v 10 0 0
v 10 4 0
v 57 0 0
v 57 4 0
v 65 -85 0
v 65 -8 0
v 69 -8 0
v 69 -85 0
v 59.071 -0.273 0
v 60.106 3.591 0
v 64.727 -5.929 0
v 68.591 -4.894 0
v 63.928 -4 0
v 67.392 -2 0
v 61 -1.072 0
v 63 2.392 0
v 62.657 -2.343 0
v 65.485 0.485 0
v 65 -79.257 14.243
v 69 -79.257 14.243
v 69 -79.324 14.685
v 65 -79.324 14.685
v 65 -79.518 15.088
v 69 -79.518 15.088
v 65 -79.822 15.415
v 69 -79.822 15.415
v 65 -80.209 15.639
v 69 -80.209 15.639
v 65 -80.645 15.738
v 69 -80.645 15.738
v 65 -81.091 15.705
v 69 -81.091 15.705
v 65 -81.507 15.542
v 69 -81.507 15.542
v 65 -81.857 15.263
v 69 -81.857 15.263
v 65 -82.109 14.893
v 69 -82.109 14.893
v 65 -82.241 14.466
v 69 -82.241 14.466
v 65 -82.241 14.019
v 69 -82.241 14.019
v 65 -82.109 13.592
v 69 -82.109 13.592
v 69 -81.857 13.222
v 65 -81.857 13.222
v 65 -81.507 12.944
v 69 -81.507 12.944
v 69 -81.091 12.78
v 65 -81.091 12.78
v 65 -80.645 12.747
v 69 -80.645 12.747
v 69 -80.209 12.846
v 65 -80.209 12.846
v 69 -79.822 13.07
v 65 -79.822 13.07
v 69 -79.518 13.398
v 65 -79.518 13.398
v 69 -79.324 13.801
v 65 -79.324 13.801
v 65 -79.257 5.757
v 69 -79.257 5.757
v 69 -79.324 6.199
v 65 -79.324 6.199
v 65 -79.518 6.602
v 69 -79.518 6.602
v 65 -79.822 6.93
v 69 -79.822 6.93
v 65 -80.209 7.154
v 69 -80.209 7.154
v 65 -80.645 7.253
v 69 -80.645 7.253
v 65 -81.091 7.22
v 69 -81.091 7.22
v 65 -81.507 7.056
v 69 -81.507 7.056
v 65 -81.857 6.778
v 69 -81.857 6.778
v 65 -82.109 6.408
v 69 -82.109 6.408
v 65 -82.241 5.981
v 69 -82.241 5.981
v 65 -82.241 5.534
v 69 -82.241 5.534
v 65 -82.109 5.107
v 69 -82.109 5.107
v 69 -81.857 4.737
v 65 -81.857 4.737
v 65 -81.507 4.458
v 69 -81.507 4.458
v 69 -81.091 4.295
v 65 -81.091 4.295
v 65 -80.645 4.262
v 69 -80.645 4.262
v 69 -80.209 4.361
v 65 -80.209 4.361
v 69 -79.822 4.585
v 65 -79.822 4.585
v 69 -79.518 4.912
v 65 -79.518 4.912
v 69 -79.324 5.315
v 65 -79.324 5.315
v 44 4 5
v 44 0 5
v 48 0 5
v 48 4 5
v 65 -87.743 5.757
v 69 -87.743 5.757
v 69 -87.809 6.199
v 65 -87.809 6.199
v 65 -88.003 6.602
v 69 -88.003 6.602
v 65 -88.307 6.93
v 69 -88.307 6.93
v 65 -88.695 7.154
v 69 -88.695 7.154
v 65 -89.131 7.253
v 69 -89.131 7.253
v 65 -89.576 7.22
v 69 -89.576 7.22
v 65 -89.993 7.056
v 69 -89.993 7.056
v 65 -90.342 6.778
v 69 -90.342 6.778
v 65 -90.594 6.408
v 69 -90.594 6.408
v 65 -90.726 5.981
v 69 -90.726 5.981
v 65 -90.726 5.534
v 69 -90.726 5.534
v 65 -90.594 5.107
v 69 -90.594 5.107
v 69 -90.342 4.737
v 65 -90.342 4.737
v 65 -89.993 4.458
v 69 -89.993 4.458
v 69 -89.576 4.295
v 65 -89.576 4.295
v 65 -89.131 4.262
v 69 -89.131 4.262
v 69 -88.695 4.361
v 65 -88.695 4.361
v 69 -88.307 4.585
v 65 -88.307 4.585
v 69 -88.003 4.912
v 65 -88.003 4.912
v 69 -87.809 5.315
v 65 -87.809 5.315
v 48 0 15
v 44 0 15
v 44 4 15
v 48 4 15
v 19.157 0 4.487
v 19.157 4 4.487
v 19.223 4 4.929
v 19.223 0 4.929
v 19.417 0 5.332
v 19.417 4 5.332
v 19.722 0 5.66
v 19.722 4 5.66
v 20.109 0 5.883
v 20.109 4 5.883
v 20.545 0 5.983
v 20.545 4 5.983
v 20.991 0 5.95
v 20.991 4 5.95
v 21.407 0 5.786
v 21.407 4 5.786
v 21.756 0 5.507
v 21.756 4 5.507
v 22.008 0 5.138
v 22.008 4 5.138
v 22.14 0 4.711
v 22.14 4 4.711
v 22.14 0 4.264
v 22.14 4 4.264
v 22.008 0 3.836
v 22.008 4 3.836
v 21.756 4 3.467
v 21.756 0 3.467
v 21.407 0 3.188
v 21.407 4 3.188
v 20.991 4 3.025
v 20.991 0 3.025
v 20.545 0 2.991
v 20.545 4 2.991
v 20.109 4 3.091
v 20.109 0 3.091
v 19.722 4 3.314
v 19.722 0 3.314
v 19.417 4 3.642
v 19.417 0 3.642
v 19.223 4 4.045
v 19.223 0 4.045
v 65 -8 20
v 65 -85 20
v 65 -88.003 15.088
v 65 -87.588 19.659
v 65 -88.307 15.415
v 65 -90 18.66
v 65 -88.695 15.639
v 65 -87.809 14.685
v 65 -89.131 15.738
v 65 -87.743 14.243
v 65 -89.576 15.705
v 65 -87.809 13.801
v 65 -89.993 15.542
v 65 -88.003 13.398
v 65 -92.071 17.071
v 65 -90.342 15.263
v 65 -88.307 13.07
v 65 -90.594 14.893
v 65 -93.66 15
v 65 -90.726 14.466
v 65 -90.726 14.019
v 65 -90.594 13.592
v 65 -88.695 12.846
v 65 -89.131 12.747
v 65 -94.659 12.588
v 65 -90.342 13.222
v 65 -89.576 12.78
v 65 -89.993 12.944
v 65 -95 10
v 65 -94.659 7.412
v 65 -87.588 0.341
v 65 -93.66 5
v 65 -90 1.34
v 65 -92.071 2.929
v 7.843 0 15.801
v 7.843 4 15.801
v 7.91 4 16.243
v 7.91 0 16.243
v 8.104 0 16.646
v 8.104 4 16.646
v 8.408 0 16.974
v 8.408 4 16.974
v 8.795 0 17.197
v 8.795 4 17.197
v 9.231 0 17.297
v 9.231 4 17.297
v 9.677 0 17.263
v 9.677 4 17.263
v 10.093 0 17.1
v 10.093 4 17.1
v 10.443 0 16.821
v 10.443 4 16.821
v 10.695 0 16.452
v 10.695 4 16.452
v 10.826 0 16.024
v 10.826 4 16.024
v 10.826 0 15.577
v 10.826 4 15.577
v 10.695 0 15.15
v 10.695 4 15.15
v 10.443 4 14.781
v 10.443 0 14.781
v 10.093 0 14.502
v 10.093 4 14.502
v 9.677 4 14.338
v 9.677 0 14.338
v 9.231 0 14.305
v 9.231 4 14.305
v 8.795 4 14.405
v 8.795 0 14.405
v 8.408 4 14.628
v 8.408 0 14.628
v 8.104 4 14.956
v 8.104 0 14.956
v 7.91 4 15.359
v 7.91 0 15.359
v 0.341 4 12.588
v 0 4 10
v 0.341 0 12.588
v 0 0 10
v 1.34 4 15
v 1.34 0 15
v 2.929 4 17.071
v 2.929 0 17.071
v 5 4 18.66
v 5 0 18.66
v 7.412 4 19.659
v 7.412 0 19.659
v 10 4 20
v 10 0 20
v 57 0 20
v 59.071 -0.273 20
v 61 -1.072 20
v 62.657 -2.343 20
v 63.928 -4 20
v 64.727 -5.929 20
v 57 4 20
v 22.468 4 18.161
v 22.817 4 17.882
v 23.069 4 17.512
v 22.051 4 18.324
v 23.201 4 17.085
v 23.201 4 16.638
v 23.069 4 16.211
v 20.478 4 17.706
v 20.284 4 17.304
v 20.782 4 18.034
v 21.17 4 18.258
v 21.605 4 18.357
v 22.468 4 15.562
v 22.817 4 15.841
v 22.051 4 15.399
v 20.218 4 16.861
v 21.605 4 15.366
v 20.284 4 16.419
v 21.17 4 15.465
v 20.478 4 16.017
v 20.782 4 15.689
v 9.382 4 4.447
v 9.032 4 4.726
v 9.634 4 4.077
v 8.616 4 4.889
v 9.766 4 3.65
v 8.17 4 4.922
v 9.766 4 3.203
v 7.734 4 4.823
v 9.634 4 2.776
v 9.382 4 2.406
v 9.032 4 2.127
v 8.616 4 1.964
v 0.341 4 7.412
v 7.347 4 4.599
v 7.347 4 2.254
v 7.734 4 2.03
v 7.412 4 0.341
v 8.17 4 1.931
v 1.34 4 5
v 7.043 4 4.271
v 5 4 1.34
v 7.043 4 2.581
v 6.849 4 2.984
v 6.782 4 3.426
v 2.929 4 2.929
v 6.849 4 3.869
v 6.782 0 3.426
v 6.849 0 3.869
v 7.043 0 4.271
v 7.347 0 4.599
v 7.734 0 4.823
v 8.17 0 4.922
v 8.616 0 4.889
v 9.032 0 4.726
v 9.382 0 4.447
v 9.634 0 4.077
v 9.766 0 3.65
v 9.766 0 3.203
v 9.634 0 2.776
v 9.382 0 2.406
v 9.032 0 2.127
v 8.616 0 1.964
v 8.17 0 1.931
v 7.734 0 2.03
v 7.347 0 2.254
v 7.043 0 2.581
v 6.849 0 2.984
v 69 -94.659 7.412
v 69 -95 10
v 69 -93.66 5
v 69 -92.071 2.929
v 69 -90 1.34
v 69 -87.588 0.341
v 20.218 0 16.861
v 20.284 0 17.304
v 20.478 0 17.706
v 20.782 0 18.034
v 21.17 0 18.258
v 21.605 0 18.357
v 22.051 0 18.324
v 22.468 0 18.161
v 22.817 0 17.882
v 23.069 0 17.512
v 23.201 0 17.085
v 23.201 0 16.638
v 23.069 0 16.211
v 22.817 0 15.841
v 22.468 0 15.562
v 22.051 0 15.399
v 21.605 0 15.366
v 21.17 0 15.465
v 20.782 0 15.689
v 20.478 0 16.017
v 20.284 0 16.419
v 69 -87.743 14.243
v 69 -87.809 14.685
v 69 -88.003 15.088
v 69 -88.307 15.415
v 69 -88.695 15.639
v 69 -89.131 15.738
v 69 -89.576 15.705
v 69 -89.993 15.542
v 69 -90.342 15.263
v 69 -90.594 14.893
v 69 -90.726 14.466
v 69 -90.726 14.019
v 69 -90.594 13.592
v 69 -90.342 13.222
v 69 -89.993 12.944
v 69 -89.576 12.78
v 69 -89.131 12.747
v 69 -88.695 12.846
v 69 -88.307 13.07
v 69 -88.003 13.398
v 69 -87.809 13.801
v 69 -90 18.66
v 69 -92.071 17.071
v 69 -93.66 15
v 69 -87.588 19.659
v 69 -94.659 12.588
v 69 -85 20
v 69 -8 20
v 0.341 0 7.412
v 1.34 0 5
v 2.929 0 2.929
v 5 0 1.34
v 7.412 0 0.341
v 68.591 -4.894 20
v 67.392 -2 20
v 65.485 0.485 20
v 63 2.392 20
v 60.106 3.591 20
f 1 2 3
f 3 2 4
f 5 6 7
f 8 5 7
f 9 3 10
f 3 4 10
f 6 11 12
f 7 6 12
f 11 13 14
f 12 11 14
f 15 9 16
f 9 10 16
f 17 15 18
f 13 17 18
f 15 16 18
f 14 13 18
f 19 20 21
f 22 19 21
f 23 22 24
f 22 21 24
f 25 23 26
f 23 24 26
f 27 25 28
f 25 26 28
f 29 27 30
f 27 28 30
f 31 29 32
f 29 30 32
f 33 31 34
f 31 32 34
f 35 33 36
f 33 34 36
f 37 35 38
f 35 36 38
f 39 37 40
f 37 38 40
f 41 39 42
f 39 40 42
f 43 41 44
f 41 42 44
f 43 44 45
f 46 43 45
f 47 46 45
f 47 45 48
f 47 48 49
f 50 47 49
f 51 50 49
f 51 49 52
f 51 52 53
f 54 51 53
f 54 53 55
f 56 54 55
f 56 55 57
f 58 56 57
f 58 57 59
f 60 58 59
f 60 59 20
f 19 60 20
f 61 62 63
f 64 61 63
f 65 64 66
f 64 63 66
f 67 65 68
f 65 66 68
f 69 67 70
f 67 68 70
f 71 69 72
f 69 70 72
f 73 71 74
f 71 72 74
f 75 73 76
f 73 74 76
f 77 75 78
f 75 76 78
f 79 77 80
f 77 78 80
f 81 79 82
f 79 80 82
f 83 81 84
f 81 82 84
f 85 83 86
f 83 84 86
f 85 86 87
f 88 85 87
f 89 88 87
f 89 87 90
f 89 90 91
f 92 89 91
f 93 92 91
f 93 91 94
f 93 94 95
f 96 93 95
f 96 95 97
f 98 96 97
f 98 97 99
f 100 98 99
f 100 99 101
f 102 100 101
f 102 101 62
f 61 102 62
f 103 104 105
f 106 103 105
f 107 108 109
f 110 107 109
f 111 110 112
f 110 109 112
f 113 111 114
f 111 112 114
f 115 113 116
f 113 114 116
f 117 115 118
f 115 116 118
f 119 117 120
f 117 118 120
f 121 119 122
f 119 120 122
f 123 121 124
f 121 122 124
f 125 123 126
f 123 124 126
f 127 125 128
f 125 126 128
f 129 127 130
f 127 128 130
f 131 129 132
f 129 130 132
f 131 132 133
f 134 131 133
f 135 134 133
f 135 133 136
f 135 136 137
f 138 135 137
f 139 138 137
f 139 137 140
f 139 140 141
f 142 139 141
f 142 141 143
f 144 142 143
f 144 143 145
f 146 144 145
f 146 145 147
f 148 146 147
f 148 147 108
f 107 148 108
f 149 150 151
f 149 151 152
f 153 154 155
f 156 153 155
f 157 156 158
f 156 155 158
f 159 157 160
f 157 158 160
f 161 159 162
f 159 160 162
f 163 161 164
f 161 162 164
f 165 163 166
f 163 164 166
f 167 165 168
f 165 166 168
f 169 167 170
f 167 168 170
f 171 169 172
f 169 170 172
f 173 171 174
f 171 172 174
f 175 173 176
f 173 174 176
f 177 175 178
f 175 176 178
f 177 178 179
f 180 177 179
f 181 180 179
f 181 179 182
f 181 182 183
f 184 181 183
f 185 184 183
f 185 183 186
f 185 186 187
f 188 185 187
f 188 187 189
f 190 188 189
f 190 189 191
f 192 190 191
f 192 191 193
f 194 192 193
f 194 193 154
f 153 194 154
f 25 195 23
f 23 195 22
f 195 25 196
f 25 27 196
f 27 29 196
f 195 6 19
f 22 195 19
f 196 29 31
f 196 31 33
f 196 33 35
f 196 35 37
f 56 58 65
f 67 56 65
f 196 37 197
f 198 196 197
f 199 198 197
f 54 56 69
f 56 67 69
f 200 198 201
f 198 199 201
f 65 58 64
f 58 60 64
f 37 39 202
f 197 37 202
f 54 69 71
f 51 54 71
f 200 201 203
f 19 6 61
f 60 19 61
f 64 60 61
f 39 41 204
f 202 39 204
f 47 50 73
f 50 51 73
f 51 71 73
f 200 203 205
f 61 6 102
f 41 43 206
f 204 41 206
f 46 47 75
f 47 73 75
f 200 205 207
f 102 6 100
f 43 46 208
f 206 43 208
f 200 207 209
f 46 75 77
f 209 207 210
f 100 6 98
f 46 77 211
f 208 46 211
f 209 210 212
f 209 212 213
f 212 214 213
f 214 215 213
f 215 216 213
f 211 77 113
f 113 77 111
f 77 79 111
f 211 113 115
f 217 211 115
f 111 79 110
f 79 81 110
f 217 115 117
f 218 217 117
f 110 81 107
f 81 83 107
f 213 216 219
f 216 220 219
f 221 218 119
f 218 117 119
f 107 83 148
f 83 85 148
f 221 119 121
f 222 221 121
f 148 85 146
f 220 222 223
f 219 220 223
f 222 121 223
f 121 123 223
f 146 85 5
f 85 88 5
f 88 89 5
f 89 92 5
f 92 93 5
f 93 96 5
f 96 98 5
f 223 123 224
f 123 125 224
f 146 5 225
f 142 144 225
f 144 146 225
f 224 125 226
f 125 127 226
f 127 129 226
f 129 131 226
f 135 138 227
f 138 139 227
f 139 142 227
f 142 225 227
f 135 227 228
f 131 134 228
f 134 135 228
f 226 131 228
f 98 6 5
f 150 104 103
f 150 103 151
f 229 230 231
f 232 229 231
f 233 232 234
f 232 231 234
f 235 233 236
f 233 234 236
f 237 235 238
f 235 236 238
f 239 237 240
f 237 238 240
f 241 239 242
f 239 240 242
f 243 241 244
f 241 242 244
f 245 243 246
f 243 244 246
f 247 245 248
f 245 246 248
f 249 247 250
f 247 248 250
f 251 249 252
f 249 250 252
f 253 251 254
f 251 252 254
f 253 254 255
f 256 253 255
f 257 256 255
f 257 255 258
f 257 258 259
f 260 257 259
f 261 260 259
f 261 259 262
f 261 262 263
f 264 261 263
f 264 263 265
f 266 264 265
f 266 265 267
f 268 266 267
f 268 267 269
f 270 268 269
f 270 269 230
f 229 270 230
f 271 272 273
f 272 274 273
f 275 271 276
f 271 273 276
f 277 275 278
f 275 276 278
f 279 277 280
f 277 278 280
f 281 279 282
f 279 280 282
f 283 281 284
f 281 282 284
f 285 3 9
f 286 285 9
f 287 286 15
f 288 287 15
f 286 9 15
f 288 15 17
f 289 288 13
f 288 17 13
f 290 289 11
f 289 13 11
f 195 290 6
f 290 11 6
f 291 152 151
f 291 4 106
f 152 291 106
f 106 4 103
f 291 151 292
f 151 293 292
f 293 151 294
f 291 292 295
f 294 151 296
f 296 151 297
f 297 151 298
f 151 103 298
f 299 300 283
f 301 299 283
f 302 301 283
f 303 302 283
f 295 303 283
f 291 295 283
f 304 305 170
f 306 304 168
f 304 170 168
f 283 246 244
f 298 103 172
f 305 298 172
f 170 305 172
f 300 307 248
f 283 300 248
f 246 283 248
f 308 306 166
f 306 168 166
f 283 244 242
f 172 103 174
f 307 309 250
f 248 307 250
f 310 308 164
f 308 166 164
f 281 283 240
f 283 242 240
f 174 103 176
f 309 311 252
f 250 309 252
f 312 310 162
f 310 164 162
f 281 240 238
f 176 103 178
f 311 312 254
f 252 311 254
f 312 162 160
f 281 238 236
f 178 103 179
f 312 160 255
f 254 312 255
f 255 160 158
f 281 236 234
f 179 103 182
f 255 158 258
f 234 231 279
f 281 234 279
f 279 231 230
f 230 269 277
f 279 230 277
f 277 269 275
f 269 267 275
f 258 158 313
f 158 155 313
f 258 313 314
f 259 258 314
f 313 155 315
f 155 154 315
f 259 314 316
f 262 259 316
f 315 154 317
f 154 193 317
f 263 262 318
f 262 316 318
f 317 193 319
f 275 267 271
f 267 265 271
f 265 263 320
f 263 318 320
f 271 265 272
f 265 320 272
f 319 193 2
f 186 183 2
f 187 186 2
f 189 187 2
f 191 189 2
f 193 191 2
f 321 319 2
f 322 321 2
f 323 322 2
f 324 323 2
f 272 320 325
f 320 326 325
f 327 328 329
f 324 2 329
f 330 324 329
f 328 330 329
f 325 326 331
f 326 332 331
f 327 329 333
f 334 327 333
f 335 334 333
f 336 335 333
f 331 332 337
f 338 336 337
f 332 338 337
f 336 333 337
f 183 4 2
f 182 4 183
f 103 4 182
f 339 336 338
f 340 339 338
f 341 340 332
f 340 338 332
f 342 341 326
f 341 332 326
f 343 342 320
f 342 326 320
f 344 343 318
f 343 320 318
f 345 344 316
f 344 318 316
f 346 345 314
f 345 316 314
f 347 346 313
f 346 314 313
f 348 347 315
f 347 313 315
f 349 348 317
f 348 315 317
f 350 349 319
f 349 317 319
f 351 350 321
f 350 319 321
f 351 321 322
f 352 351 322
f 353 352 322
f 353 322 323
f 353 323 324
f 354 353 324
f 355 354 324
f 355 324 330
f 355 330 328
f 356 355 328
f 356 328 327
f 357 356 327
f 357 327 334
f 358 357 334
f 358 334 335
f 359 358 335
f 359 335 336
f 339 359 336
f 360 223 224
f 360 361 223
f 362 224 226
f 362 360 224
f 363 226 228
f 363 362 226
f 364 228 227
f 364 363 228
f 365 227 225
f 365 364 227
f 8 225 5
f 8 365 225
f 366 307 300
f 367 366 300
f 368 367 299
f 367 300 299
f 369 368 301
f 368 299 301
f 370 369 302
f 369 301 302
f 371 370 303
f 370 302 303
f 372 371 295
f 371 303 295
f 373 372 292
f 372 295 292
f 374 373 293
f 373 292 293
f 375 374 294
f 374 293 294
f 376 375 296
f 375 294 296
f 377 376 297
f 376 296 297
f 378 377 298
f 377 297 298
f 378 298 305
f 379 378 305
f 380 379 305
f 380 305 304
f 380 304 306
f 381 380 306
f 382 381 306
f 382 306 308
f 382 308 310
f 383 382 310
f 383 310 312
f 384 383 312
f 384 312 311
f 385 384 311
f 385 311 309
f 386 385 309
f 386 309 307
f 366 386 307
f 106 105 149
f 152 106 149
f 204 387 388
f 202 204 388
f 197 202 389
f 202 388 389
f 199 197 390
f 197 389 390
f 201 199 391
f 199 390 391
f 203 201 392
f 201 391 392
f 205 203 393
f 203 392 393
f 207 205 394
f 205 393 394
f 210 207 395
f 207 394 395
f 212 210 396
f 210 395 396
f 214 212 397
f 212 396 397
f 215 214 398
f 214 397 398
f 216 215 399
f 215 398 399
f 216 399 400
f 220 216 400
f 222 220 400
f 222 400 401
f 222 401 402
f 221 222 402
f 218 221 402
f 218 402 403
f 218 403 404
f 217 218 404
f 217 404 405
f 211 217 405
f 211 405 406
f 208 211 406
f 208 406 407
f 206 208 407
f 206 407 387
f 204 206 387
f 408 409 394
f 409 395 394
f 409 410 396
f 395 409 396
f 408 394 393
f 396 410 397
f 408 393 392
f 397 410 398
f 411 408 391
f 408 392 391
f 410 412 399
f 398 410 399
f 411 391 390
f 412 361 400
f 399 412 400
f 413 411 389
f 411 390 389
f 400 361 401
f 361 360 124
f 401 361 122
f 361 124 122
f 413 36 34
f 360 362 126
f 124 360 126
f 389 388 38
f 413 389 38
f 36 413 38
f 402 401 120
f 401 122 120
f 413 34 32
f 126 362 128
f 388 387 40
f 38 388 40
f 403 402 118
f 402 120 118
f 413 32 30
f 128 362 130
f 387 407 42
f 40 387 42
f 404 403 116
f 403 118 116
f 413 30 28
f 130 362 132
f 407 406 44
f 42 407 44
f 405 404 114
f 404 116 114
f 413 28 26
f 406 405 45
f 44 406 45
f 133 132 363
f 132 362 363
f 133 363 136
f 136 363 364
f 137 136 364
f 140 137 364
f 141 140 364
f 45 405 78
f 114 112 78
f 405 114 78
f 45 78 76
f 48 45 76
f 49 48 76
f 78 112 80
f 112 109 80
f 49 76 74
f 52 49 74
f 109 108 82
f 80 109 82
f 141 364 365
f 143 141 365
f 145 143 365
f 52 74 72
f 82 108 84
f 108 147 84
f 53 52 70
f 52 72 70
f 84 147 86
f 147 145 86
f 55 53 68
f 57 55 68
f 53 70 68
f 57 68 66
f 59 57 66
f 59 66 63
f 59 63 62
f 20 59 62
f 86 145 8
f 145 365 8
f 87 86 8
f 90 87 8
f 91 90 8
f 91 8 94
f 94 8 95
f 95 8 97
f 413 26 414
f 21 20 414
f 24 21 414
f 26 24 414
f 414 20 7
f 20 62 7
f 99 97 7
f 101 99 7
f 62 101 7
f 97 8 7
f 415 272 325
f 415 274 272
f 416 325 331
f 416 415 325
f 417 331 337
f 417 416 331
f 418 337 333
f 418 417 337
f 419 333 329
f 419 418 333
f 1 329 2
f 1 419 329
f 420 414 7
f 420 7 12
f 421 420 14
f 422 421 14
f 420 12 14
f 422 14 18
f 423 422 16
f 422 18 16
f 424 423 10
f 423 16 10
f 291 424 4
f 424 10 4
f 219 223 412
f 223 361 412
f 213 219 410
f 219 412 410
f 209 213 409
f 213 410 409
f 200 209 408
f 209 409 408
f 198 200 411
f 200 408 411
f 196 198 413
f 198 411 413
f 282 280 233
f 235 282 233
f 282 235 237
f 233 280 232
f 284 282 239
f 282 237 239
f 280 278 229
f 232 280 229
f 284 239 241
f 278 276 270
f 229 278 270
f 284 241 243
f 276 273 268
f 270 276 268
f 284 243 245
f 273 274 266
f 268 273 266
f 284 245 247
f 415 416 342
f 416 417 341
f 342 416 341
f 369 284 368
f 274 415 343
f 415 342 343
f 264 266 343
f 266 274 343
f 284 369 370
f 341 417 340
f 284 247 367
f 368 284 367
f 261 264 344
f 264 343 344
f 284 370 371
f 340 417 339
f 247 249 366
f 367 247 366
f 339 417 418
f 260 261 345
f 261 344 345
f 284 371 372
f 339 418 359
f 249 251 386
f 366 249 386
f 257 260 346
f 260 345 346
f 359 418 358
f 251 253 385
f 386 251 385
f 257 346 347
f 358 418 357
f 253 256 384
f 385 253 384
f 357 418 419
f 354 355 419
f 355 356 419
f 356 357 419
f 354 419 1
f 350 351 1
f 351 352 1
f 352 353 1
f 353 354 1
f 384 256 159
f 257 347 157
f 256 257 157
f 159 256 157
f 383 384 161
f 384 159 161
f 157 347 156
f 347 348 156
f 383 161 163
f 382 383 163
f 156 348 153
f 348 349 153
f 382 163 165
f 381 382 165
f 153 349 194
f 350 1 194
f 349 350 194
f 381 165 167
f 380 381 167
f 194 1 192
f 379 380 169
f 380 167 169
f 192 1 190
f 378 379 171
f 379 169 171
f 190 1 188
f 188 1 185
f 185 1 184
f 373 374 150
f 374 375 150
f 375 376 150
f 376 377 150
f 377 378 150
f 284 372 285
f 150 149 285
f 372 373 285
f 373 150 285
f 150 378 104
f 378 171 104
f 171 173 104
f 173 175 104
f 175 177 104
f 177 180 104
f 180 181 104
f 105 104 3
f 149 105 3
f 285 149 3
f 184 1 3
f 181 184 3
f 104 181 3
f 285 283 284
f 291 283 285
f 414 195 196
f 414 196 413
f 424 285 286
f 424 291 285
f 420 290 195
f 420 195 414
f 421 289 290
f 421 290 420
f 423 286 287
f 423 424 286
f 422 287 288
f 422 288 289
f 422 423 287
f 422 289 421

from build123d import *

# Parameters (mm, degrees)
F1_DEPTH = 20
F4_R     = 9.99999
F6_D     = 3
F2_W     = 4
F2_H     = 10
F7_DEPTH = 25
F8_D     = 3


# Not quite as in the source:
# - a fillet or chamfer is up to 0.001 mm smaller than in the source, because OpenCascade refuses the exact size
# - a feature names something its author has since deleted; it is built from what else it names


with BuildPart() as f1:
    # F0 (on Top) → F1 (new body)
    with BuildSketch(Plane.XY):
        with BuildLine():
            Line((0, 4), (0, 0))
            Line((0, 0), (57, 0))
            ThreePointArc((57, 0), (62.6568542495, -2.3431457505), (65, -8))
            Line((65, -8), (65, -95))
            Line((65, -95), (69, -95))
            Line((69, -95), (69, -8))
            ThreePointArc((69, -8), (65.4852813742, 0.4852813742), (57, 4))
            Line((57, 4), (0, 4))
        make_face()
    extrude(amount=F1_DEPTH)

    # F4 (radius 10 in the source; OpenCascade refuses exactly that, so slightly less here)
    f4_edges = [f1.edges().sort_by_distance(p)[0] for p in [
        (0, 2, 20),
        (0, 2, 0),
        (67, -95, 20),
        (67, -95, 0),
    ]]
    fillet(f4_edges, radius=F4_R)

    # F6 (through all)
    with Locations(Plane(origin=(65, 0, 0), x_dir=(0, -1, 0), z_dir=(-1, 0, 0))):
        with Locations((80.7573593129, 14.2426406871), (80.7573593129, 5.7573593129), (89.2426406871, 5.7573593129), (89.2426406871, 14.2426406871)):
            Hole(F6_D / 2)

    # F2 (on face) → F7 (cut)
    with BuildSketch(Plane.XZ):
        with Locations((46, 10)):
            Rectangle(F2_W, F2_H)
    extrude(amount=-F7_DEPTH, mode=Mode.SUBTRACT)

    # F8 (through all)
    with Locations(Plane.XZ):
        with Locations((8.2824855787, 3.4264645687), (21.7175144213, 16.8614934112), (20.6568542495, 4.4871247404), (9.3431457505, 15.8008332394)):
            Hole(F8_D / 2)


solid = f1.part
